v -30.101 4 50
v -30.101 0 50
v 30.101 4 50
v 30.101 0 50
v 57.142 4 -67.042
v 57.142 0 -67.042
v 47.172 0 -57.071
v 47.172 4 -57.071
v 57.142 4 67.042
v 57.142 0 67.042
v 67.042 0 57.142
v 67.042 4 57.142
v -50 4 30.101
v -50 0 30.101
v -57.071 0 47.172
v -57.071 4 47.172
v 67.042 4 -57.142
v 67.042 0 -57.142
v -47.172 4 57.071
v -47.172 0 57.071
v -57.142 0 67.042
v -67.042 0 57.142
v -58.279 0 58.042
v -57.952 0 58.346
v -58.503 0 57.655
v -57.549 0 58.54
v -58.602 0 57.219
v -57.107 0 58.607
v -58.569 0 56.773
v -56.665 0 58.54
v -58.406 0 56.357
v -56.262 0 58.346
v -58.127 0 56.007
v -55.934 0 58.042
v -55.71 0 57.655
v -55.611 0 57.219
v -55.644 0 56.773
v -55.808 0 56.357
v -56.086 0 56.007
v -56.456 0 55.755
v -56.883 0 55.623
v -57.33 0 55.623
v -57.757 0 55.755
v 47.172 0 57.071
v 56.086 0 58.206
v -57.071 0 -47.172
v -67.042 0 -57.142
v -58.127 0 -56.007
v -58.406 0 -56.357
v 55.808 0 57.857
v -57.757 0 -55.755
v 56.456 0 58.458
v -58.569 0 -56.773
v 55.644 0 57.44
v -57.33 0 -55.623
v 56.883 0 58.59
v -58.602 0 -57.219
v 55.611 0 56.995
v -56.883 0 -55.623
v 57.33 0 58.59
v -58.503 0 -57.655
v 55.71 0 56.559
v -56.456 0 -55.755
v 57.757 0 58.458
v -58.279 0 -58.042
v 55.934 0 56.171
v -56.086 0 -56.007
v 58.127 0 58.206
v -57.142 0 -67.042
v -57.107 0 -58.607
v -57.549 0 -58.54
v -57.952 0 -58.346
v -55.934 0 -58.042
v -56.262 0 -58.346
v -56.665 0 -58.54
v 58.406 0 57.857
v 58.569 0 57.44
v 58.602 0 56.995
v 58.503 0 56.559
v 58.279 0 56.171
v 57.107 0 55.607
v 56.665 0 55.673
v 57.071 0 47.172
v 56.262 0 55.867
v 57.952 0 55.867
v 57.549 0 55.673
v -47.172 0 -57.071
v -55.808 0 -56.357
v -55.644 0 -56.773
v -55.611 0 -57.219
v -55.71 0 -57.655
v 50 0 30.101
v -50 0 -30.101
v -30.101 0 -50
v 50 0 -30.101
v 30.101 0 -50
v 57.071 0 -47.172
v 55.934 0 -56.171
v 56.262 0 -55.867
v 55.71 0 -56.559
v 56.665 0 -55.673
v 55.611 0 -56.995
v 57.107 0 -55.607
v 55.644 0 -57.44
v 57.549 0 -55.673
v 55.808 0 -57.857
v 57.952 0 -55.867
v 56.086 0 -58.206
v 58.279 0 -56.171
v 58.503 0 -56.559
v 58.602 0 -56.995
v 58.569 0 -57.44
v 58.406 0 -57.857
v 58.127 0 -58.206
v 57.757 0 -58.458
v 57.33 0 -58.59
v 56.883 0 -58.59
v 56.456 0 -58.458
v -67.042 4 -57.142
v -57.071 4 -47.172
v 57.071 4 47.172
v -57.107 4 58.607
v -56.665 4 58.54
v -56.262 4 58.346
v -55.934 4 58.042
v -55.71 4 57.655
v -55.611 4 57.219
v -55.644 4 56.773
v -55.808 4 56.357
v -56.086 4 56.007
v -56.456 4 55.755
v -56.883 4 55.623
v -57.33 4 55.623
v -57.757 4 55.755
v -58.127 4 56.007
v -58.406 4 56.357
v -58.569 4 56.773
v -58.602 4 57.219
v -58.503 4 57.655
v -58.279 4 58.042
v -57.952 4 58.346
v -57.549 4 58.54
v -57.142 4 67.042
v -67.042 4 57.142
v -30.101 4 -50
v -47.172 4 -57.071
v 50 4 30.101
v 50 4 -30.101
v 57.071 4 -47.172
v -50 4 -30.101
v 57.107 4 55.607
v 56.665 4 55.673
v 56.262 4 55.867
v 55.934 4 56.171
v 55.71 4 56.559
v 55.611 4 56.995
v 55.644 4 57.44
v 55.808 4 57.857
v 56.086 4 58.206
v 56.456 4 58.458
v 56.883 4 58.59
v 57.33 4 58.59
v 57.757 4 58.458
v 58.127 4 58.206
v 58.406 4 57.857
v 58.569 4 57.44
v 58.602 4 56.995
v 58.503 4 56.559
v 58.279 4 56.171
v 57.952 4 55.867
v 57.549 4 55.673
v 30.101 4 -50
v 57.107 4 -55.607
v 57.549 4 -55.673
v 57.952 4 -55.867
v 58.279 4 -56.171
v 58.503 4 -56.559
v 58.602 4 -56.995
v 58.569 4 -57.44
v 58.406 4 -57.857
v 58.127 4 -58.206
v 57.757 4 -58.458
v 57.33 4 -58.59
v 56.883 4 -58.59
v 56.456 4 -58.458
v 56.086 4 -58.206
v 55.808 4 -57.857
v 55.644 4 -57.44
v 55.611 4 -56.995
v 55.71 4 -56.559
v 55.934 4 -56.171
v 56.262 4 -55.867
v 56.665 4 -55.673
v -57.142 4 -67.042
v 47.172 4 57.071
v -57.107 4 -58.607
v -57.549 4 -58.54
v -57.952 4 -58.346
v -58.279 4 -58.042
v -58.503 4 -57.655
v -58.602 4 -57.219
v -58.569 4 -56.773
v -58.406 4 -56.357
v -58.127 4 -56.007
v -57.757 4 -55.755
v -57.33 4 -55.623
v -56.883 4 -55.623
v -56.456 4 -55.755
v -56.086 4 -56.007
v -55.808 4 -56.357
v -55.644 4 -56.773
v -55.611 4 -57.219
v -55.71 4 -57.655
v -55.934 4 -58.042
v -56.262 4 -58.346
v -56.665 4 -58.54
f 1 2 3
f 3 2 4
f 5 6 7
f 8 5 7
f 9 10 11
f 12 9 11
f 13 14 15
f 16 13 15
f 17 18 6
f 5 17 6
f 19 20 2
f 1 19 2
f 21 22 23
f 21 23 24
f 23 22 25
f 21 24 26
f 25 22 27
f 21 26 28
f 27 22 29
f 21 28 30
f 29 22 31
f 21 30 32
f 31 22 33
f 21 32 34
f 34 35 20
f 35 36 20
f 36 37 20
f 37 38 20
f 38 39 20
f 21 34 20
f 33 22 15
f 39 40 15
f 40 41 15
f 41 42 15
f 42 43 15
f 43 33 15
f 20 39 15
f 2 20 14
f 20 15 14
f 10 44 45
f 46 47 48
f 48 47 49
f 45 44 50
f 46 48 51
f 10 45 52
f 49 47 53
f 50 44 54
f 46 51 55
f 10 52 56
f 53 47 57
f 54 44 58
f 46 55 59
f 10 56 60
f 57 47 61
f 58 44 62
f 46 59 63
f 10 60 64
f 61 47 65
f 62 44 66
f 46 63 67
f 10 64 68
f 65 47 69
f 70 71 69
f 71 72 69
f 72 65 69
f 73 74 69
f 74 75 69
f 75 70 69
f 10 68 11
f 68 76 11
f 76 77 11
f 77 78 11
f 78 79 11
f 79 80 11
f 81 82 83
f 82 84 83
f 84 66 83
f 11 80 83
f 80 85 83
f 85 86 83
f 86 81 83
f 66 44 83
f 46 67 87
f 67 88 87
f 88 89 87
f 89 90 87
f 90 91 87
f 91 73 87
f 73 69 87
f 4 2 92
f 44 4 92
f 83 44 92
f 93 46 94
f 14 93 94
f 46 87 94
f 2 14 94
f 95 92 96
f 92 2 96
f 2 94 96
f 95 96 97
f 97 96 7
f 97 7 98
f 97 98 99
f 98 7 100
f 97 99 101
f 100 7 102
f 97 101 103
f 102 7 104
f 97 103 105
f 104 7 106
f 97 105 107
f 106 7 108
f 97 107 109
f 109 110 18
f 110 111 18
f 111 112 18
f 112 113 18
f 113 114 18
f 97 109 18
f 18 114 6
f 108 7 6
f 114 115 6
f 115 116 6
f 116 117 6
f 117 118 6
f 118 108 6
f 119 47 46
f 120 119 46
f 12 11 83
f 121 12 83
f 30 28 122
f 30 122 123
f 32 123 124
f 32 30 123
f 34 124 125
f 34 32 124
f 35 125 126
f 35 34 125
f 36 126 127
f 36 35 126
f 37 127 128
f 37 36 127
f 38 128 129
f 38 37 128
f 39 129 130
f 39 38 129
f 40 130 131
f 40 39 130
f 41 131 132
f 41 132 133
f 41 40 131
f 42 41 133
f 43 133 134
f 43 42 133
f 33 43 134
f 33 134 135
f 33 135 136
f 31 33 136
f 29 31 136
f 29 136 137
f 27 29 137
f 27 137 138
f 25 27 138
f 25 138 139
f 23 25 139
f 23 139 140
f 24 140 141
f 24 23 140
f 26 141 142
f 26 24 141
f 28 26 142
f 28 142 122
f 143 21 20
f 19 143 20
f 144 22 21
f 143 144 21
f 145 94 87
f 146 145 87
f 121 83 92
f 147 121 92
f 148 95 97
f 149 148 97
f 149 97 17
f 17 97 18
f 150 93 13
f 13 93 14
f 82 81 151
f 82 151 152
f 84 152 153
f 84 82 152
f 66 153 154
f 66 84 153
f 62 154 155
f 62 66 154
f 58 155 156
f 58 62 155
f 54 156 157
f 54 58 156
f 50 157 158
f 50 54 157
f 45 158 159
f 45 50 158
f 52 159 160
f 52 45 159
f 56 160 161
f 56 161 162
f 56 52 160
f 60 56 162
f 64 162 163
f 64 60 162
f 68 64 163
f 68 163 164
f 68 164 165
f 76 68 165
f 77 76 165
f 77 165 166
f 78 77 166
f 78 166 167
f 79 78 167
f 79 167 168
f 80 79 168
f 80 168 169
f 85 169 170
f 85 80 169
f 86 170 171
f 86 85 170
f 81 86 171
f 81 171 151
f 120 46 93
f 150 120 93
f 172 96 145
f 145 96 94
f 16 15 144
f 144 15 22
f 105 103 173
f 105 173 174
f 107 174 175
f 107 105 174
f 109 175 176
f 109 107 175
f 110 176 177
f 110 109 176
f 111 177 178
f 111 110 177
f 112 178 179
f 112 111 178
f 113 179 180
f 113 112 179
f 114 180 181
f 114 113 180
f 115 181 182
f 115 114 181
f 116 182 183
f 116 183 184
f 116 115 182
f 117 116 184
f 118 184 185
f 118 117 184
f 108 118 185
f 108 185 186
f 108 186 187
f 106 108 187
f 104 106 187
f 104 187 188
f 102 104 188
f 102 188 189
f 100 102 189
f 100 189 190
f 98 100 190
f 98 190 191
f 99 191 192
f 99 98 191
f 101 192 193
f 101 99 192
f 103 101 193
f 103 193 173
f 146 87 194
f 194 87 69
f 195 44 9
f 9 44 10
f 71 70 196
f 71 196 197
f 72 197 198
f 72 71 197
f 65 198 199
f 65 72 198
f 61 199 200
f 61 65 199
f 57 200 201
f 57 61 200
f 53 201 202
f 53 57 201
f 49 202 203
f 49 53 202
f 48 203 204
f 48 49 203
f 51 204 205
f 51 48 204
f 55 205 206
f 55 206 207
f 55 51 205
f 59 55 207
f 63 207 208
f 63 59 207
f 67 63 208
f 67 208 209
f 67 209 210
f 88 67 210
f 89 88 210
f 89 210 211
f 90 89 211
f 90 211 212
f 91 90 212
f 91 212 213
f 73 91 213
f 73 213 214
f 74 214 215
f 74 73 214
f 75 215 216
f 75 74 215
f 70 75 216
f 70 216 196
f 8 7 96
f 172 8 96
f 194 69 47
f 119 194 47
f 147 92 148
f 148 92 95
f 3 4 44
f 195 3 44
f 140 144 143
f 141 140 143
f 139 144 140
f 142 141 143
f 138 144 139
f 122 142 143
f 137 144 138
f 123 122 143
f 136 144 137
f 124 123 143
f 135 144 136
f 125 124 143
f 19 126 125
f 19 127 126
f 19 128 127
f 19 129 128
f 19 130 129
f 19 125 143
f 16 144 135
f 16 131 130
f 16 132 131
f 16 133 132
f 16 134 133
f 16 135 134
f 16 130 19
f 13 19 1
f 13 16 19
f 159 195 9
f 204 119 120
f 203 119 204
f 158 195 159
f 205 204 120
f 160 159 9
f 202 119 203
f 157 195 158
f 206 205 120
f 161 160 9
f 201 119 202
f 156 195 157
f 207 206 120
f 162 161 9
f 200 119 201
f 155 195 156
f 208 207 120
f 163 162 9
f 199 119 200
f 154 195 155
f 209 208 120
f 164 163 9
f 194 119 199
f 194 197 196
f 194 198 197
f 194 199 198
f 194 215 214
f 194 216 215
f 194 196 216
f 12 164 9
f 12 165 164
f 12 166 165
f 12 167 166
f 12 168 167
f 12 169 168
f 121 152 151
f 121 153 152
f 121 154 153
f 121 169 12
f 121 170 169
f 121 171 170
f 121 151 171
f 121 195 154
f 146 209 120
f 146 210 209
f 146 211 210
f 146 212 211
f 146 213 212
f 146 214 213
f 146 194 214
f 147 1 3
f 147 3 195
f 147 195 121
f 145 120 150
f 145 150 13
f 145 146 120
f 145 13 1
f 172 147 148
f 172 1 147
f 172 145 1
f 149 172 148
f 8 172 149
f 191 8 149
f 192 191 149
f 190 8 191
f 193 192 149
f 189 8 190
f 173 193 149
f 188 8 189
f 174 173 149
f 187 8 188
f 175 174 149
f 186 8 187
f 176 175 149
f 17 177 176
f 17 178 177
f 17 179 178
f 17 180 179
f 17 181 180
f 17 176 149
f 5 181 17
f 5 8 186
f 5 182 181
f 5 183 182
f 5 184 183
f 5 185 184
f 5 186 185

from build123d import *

# Parameters (mm, degrees)
SKETCH1_R           = 1.5
BOSS_EXTRUDE2_DEPTH = 4


with BuildPart() as part:
    # Sketch1 → Boss-Extrude2 (new body)
    with BuildSketch(Plane(origin=(0, 0, 0), x_dir=(1, 0, 0), z_dir=(0, 1, 0))):
        Polygon((-30.100505063, -50), (30.100505063, -50), (47.171572875, -57.071067812), (57.142268085, -67.041763021), (67.041763021, -57.142268085), (57.071067812, -47.171572875), (50, -30.100505063), (50, 30.100505063), (57.071067812, 47.171572875), (67.041763021, 57.142268085), (57.142268085, 67.041763021), (47.171572875, 57.071067812), (30.100505063, 50), (-30.100505063, 50), (-47.171572875, 57.071067812), (-57.142268085, 67.041763021), (-67.041763021, 57.142268085), (-57.071067812, 47.171572875), (-50, 30.100505063), (-50, -30.100505063), (-57.071067812, -47.171572875), (-67.041763021, -57.142268085), (-57.142268085, -67.041763021), (-47.171572875, -57.071067812), align=None)
        with Locations(Location((-57.106667948, -57.106667948, 0), (0, 0, 270))):
            Circle(SKETCH1_R, mode=Mode.SUBTRACT)
        with Locations(Location((-57.106667948, 57.106667948, 0), (0, 0, 90))):
            Circle(SKETCH1_R, mode=Mode.SUBTRACT)
        with Locations(Location((57.106667948, -57.106667948, 0), (0, 0, 90))):
            Circle(SKETCH1_R, mode=Mode.SUBTRACT)
        with Locations(Location((57.106667948, 57.106667948, 0), (0, 0, 270))):
            Circle(SKETCH1_R, mode=Mode.SUBTRACT)
    extrude(amount=BOSS_EXTRUDE2_DEPTH)


solid = part.part
